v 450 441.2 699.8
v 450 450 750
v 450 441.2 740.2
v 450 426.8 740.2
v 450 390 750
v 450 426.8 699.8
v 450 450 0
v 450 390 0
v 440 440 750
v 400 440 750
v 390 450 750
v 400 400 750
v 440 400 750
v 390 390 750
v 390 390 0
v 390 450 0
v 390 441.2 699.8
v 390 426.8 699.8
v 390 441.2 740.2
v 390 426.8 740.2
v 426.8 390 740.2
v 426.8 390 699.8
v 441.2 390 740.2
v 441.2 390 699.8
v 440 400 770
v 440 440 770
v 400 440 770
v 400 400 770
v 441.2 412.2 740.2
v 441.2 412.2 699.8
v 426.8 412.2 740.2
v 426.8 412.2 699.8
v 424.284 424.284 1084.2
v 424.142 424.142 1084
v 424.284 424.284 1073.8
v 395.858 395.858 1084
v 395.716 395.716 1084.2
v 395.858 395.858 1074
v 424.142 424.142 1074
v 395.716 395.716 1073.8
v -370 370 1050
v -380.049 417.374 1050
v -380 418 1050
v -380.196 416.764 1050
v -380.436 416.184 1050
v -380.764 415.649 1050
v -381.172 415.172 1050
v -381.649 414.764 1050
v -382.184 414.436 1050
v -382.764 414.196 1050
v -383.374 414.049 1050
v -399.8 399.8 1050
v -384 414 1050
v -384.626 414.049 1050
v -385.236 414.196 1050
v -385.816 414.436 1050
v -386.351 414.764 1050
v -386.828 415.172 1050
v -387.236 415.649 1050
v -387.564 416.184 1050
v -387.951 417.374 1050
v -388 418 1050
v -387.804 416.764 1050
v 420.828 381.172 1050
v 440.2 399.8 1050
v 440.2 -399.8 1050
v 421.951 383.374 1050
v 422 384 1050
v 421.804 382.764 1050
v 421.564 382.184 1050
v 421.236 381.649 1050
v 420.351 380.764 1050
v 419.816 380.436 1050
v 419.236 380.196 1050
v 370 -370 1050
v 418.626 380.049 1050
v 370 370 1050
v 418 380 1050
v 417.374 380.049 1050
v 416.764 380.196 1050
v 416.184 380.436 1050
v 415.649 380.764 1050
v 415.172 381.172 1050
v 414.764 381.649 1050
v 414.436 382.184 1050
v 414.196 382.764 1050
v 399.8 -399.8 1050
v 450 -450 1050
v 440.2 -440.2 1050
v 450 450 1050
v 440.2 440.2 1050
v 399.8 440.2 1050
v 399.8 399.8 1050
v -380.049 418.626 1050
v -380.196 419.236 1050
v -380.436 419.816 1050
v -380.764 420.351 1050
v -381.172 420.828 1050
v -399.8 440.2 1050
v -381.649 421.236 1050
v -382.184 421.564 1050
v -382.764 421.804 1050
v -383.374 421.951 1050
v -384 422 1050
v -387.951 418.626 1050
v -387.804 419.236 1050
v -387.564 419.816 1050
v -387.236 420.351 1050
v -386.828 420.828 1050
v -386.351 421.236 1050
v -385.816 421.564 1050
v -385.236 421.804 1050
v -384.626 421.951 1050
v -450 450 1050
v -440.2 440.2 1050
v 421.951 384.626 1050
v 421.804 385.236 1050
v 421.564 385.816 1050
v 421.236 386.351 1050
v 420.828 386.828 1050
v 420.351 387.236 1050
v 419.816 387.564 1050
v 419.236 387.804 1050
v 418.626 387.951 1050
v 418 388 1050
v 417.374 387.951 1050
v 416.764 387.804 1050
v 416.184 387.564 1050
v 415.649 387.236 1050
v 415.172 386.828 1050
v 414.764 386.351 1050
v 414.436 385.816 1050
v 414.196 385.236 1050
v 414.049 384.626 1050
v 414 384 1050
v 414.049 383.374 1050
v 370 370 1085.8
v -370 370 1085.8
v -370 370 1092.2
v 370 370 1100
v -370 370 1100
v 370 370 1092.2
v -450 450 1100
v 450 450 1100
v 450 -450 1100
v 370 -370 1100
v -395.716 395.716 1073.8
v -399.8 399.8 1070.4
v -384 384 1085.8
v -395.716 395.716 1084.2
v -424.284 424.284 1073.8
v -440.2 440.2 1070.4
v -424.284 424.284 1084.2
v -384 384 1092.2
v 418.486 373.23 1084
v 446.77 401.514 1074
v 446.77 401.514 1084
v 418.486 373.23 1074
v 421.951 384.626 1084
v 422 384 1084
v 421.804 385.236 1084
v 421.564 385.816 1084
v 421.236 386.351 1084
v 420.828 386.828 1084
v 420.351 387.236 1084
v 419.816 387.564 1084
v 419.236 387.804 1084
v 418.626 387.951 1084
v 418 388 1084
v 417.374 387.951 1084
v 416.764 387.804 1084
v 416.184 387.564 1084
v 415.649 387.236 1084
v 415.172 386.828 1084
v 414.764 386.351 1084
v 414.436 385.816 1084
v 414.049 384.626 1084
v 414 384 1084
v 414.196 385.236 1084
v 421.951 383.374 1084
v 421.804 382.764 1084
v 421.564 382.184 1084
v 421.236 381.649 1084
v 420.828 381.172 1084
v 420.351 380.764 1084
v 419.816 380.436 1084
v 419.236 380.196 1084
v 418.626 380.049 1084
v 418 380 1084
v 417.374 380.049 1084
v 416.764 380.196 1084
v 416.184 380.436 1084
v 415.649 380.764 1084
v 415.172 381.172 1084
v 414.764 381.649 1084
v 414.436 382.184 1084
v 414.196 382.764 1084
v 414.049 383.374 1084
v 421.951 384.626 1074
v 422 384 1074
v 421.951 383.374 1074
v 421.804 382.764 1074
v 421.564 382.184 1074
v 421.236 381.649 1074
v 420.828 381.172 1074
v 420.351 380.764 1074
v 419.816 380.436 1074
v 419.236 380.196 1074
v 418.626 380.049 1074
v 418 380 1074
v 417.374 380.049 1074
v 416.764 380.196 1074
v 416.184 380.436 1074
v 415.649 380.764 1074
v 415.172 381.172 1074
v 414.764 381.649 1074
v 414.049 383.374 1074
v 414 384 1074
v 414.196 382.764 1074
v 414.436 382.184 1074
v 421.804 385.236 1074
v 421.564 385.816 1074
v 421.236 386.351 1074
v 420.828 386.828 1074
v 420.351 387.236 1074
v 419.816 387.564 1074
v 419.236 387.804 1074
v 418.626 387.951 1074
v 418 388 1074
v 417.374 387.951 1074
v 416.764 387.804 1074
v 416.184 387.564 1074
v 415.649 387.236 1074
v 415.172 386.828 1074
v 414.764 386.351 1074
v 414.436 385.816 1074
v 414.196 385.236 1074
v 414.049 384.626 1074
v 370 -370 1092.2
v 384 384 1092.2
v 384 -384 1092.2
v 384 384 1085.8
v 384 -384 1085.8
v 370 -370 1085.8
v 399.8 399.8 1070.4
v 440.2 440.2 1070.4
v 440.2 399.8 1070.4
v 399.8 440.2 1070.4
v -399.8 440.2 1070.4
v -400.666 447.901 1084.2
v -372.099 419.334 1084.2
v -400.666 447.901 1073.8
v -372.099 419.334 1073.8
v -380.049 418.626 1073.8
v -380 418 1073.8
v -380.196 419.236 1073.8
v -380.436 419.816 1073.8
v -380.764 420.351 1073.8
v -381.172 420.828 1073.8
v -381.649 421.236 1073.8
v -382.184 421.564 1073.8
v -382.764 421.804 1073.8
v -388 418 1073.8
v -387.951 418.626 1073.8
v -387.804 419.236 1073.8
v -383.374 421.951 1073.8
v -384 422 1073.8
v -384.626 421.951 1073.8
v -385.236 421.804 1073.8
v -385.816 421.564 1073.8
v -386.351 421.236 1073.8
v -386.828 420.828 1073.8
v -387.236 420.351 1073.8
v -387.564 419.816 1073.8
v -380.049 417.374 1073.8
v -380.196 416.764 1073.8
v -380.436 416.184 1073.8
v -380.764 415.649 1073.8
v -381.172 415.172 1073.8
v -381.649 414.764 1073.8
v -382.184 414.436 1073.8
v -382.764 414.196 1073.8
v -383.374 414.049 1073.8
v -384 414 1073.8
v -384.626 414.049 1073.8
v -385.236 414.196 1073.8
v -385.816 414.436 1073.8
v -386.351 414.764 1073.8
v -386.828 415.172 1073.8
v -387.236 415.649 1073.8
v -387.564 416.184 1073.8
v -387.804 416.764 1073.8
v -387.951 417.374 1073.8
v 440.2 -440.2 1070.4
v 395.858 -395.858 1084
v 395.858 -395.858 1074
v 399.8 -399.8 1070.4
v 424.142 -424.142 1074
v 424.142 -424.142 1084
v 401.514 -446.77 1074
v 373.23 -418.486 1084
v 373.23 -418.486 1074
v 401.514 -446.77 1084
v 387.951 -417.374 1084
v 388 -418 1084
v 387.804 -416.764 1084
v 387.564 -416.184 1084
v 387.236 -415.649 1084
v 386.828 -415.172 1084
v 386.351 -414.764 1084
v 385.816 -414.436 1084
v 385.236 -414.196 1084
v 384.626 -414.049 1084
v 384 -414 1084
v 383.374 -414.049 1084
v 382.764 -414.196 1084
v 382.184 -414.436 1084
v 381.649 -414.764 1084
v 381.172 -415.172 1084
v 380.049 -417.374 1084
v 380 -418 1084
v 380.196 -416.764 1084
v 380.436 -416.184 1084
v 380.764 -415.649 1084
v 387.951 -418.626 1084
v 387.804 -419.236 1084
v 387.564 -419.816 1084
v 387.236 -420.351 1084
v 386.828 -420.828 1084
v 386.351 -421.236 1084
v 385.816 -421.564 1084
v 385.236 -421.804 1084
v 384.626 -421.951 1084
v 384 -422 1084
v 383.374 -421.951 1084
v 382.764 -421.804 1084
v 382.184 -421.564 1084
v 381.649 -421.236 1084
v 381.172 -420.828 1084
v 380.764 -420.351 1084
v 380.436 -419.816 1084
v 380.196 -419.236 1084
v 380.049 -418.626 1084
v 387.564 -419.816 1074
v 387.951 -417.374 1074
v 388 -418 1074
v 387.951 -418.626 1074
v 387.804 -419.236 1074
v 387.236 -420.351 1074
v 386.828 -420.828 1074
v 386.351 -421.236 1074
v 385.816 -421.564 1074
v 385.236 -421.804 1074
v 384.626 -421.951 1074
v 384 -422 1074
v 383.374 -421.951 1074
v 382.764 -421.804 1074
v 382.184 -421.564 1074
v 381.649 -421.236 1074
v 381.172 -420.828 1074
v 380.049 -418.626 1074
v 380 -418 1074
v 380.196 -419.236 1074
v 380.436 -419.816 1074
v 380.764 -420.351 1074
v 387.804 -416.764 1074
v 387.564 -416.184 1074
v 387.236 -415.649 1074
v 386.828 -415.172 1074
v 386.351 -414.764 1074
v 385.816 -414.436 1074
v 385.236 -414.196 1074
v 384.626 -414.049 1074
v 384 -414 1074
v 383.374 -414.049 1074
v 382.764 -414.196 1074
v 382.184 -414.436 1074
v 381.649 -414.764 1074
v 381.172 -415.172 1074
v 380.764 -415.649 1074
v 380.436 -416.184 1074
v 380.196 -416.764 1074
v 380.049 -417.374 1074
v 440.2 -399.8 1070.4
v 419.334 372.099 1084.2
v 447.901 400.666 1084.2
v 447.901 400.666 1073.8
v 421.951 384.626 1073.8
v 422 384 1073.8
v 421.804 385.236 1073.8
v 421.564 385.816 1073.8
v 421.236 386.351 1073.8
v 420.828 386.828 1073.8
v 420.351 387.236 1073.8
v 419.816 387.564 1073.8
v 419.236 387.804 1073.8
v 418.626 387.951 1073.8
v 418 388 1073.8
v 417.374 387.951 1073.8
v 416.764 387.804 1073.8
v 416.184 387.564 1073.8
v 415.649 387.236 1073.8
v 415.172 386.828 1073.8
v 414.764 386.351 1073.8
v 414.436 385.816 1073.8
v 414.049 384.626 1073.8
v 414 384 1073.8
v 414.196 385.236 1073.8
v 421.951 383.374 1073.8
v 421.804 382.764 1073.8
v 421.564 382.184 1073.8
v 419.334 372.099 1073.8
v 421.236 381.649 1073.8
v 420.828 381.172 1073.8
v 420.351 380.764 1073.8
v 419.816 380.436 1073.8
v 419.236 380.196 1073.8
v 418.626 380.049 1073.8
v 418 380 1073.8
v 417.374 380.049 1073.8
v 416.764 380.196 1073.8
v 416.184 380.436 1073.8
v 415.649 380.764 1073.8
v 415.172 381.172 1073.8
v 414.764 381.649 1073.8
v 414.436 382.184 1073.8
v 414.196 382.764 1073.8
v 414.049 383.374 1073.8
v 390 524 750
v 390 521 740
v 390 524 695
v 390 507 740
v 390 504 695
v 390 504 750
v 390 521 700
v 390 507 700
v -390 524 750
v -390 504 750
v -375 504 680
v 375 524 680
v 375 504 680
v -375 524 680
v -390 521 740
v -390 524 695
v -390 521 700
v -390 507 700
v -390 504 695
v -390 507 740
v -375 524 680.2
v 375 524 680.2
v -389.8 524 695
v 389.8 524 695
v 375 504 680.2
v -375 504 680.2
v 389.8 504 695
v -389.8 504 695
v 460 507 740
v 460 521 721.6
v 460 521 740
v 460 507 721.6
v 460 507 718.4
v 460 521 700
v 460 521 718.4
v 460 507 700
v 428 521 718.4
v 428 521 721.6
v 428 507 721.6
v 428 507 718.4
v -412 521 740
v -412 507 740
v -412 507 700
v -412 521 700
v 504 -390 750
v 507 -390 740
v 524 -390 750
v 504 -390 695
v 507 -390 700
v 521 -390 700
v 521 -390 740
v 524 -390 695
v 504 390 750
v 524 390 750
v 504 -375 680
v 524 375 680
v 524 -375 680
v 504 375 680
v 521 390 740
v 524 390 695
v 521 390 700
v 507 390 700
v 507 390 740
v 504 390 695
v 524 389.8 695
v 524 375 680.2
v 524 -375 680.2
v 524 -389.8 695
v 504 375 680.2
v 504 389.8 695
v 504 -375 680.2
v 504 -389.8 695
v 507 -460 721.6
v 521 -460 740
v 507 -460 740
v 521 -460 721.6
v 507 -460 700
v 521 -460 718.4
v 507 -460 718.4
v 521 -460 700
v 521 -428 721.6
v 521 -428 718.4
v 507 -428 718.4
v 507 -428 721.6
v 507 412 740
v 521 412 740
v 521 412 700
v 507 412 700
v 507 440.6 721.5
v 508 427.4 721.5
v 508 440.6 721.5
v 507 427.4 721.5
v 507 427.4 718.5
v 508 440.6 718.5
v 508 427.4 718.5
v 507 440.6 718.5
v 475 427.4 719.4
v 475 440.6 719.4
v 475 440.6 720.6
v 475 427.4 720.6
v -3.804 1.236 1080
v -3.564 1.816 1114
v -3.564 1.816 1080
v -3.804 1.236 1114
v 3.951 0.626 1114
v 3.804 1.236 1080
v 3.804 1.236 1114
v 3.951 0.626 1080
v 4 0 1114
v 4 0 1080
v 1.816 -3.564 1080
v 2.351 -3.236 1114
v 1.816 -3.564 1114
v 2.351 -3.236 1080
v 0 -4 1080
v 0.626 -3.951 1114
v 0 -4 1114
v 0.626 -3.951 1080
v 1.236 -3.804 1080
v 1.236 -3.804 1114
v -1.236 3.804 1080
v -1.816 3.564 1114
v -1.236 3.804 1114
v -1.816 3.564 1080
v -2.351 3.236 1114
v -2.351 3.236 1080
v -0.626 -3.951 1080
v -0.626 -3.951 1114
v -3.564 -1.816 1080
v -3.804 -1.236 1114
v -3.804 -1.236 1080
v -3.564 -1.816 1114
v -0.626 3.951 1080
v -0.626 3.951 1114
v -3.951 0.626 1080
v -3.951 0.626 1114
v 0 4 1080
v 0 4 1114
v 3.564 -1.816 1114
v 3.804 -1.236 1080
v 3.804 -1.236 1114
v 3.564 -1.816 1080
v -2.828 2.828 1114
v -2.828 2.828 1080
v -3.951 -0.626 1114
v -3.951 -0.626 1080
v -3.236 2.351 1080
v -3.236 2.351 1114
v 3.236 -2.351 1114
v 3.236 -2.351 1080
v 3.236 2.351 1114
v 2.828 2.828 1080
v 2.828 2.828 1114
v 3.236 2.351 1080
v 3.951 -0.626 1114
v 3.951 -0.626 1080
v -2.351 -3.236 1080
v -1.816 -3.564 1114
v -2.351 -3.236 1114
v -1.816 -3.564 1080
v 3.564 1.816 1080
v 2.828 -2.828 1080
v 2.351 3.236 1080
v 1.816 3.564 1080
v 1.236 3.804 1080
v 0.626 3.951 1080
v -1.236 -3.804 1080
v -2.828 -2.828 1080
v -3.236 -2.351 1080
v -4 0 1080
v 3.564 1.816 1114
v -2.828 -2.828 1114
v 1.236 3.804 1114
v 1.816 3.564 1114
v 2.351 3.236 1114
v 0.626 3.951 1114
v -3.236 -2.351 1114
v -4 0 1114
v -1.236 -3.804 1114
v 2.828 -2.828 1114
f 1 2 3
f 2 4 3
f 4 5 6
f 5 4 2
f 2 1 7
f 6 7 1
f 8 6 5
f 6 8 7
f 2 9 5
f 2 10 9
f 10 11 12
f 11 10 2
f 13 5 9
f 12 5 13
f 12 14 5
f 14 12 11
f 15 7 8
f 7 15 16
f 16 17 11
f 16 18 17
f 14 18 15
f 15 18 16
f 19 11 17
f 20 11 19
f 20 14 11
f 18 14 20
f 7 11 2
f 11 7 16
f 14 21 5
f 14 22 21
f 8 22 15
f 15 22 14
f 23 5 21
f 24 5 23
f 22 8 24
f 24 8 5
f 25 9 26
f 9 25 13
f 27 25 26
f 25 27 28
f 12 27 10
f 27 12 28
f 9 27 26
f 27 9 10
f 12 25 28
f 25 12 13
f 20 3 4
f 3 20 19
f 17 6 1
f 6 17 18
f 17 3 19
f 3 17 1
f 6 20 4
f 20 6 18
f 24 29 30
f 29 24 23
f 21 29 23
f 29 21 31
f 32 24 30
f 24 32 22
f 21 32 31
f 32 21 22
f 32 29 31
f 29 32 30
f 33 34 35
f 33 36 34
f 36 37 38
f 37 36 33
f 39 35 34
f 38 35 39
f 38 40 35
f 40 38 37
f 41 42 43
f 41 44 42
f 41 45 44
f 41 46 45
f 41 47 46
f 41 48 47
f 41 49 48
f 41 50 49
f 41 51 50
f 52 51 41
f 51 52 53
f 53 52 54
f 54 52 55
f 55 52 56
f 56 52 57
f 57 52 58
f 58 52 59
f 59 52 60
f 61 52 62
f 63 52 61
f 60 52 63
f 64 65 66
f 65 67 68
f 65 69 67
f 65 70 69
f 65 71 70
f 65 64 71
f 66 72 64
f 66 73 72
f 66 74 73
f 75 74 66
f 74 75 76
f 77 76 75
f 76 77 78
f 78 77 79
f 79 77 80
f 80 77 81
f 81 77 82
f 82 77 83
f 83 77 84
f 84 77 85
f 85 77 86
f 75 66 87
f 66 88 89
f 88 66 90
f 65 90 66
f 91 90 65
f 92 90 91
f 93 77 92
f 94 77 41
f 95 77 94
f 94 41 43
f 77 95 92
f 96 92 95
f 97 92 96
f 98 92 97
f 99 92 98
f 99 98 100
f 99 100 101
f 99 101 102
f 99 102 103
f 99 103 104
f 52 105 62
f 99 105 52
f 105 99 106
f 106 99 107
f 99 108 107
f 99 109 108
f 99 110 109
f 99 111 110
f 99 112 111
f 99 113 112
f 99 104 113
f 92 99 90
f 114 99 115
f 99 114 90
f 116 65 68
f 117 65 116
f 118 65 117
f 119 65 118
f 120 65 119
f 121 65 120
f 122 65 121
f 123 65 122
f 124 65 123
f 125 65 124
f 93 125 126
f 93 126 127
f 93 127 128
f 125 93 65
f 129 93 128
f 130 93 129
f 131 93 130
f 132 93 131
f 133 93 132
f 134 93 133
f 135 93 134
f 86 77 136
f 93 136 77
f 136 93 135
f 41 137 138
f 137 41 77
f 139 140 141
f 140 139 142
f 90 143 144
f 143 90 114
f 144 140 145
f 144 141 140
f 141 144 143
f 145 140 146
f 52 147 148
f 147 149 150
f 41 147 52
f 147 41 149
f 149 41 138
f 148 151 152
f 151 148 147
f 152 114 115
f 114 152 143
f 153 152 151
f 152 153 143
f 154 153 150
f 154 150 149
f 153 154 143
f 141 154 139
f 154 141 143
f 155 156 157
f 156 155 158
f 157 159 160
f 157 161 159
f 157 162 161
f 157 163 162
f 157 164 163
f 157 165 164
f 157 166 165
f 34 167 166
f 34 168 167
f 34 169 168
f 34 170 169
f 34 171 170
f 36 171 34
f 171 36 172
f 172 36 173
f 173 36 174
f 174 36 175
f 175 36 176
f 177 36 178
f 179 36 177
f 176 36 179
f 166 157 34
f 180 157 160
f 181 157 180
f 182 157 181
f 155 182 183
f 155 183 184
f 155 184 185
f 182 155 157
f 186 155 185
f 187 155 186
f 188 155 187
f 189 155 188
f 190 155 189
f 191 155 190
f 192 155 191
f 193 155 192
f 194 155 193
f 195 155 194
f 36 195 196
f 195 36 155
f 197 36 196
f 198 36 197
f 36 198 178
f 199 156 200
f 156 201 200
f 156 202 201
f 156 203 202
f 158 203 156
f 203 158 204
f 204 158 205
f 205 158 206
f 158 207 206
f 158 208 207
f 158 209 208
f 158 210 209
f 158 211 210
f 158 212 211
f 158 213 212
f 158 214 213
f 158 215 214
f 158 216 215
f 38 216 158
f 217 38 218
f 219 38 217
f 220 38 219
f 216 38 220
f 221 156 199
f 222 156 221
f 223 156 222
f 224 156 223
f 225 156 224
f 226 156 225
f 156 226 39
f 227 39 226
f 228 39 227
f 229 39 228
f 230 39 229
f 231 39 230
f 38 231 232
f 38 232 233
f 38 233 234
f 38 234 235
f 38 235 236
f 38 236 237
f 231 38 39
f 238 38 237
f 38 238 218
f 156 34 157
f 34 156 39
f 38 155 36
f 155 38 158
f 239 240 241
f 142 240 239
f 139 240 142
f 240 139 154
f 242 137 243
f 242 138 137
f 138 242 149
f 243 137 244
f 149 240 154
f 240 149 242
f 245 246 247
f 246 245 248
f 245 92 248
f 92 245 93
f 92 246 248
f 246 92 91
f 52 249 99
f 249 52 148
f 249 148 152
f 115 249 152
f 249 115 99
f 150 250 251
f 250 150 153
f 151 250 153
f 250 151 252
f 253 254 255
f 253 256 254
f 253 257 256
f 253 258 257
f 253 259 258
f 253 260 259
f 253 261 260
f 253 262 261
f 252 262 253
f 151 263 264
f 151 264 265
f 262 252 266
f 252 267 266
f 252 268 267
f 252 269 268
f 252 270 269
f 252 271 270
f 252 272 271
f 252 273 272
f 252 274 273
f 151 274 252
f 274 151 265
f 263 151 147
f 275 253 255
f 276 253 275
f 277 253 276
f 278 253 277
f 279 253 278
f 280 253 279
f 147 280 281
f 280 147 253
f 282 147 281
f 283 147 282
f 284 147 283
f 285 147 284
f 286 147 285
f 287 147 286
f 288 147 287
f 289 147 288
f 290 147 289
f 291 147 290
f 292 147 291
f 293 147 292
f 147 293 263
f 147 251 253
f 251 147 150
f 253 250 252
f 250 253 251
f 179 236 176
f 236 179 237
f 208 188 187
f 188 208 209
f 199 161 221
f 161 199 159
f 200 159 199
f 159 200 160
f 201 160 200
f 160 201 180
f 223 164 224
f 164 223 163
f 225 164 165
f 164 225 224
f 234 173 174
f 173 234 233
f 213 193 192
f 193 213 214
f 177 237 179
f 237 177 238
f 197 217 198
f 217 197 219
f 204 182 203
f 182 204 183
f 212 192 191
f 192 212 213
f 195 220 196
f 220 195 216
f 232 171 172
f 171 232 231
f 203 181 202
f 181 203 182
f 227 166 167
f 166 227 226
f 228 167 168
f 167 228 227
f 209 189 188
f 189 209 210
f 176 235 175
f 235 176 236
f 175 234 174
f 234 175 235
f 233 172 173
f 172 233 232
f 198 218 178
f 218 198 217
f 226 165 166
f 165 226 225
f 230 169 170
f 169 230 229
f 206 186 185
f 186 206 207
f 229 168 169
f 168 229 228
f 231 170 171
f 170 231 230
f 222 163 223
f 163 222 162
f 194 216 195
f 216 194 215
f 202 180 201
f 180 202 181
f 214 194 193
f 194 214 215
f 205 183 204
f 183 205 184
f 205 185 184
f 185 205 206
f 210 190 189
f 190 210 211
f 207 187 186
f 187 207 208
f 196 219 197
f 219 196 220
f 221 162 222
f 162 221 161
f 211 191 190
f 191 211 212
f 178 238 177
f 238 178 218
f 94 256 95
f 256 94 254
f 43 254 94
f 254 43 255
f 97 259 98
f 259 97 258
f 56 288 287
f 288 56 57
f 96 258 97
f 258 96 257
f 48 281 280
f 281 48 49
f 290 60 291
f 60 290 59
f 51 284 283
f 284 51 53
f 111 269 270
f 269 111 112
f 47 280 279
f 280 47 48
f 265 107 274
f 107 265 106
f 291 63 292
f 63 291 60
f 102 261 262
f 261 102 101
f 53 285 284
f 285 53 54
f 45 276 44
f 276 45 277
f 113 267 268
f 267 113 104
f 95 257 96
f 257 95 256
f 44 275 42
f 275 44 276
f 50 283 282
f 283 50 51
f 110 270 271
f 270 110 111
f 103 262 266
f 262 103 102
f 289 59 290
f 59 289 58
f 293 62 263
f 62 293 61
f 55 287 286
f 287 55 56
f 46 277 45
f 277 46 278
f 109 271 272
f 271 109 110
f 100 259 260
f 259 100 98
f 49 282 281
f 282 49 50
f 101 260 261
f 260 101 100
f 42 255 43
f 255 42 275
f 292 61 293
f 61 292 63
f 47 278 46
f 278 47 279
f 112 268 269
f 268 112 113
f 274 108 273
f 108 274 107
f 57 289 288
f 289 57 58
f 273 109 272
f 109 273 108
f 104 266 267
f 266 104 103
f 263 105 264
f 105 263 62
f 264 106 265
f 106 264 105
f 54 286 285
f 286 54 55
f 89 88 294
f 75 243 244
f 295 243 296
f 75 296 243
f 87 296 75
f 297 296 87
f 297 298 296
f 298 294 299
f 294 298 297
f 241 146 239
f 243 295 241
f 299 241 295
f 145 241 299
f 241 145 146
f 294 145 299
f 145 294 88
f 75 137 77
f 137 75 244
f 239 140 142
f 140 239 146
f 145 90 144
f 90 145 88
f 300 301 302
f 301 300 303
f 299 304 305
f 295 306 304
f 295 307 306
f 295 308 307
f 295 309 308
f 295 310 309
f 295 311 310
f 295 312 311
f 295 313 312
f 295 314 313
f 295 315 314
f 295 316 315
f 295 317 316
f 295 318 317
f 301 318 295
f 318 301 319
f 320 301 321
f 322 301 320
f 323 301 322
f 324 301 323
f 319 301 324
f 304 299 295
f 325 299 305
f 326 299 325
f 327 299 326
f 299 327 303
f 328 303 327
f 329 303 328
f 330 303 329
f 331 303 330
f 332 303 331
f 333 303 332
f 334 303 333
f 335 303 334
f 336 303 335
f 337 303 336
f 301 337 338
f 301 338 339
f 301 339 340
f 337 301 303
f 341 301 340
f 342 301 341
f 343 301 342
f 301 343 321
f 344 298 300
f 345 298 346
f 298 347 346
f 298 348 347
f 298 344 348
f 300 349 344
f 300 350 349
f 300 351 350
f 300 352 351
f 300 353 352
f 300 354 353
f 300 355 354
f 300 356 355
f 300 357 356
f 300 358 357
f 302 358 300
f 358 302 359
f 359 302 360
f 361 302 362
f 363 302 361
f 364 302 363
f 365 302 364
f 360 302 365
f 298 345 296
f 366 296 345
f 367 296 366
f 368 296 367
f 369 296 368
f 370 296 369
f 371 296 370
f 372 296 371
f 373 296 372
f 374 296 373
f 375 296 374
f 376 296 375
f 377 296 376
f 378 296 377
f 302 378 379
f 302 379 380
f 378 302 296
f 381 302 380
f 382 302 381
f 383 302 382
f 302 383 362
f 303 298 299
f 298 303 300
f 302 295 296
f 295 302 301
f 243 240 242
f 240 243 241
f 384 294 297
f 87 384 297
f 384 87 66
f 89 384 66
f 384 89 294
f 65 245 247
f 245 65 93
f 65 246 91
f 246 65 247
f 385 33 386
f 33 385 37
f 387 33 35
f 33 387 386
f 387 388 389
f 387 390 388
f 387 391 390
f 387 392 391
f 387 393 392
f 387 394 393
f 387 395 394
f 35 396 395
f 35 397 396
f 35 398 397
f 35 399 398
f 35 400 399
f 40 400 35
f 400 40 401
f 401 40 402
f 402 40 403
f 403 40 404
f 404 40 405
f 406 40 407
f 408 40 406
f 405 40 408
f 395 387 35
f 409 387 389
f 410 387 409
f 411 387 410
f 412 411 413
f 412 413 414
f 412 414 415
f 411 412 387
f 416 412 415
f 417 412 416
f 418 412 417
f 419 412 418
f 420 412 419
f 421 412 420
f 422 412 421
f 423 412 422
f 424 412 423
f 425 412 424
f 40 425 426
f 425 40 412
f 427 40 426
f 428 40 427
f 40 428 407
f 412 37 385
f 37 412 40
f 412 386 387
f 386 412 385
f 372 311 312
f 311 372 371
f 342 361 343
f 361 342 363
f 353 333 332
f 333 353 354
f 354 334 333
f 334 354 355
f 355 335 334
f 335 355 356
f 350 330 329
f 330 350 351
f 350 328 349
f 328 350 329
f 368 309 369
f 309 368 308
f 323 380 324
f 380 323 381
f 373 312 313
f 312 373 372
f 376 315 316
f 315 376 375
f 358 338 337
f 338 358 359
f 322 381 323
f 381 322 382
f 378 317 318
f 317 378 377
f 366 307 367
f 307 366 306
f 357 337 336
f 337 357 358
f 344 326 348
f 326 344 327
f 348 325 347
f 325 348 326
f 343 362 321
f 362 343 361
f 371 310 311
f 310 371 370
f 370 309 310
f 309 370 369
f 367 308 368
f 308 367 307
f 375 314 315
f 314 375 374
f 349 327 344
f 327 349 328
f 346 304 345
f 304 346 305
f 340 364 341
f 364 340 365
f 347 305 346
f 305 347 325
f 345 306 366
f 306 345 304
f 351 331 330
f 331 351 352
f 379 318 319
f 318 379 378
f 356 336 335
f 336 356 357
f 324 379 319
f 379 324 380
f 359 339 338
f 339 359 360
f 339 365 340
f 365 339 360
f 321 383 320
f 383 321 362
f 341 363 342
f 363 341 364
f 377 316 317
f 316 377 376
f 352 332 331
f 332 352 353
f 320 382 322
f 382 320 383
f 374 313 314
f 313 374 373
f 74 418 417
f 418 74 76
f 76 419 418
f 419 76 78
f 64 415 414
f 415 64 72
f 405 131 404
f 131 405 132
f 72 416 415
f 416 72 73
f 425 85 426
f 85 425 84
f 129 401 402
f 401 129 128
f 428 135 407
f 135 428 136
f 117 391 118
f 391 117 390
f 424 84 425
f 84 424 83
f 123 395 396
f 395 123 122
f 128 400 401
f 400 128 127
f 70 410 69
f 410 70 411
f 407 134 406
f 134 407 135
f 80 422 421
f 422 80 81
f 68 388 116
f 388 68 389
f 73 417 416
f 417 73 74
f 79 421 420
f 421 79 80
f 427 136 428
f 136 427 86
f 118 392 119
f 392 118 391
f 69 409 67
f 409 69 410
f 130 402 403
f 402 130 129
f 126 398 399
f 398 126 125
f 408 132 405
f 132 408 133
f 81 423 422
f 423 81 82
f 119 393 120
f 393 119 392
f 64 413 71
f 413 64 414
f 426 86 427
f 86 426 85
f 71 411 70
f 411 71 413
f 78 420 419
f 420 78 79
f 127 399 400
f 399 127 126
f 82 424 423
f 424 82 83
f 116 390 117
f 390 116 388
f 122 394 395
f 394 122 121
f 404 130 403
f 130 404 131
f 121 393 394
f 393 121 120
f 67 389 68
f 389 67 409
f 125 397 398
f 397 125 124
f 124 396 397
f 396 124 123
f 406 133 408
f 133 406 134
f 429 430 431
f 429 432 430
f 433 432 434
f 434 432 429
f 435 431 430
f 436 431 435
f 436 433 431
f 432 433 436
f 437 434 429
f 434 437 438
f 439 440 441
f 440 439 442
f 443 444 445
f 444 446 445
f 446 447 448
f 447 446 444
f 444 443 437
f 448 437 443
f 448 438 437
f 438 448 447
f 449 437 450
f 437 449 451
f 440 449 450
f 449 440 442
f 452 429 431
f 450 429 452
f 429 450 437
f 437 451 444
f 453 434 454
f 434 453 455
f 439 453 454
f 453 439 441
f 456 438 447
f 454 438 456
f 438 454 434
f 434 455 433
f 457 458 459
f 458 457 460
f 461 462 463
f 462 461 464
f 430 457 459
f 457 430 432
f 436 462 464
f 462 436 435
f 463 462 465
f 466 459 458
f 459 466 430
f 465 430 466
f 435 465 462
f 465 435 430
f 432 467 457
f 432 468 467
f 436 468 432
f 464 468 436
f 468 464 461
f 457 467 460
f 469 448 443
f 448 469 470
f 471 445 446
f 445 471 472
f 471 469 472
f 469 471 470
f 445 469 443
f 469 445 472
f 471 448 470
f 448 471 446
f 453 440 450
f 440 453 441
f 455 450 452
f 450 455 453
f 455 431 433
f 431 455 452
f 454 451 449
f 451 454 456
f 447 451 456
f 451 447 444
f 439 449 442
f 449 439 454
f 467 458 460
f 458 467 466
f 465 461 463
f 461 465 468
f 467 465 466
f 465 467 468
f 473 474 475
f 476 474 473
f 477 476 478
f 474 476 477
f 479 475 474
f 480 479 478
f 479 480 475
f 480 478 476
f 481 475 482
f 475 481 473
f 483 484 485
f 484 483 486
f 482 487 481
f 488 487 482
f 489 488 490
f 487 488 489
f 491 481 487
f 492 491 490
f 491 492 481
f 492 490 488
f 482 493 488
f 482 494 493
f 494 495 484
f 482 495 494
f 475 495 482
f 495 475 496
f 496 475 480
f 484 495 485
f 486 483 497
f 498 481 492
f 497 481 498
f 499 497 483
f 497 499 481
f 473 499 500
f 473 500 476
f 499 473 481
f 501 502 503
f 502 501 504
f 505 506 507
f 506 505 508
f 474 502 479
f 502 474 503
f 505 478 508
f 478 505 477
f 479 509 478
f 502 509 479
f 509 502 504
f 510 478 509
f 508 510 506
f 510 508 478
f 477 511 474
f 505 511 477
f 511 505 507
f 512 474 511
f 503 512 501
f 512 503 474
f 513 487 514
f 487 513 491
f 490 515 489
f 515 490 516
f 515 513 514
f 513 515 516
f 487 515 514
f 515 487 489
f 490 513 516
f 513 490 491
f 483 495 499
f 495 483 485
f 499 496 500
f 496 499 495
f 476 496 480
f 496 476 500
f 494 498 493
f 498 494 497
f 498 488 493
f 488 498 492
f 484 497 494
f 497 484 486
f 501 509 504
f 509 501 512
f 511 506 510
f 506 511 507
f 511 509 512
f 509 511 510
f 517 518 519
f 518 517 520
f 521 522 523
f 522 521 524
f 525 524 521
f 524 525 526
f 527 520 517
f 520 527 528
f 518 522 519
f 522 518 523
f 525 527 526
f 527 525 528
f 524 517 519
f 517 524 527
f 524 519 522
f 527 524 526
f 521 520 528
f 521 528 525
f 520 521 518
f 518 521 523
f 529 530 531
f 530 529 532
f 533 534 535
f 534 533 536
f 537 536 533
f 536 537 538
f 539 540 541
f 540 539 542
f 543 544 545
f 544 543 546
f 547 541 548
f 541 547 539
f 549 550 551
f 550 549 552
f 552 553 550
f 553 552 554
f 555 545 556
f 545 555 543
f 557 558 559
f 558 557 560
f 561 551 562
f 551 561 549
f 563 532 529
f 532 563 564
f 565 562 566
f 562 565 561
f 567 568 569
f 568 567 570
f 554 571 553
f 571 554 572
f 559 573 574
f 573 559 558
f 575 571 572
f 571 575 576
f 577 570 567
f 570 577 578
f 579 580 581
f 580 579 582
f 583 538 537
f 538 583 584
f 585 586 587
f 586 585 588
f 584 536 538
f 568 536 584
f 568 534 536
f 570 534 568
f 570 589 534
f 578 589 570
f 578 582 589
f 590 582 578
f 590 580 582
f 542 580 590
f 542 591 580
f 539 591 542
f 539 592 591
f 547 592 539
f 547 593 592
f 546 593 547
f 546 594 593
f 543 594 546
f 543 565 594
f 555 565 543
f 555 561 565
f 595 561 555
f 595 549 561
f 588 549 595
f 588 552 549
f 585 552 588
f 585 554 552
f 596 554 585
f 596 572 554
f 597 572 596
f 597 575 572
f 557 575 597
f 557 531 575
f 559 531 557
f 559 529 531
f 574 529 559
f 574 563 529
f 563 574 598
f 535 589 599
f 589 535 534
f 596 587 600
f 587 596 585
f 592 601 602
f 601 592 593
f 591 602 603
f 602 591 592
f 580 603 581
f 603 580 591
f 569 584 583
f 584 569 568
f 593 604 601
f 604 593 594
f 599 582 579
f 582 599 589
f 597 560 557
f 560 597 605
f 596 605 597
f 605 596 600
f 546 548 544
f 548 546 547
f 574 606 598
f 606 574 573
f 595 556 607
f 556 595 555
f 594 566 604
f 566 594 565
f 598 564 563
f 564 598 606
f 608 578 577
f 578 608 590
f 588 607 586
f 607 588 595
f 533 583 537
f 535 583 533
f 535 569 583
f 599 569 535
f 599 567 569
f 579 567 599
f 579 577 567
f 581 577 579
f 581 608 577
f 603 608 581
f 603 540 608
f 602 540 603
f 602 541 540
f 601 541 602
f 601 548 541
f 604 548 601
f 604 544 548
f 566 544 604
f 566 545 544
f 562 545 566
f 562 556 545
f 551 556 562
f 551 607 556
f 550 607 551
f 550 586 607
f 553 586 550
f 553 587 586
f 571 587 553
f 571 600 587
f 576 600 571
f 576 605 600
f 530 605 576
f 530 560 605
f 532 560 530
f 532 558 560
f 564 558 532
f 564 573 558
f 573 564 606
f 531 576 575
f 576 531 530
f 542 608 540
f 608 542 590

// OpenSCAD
// file: parts.scad
$fn=40;

// ---- 桌腿 ----

module leg(){
  difference(){
    union(){
      translate([390.000,390.000,0.000]) cube([60.000,60.000,750.000]);
      translate([400.000,400.000,750.000]) cube([40.000,40.000,20.000]);
    }
    // 牙板透榫槽（沿 +x，+y 侧牙板 A 端穿入）
    translate([389.000,426.800,699.800]) cube([62.000,14.400,40.400]);
    // 牙板闷榫槽（沿 +y，+x 侧牙板 B 端）
    translate([426.800,389.000,699.800]) cube([14.400,23.200,40.400]);
  }
}

// ---- 边框 ----

module rail(){
  difference(){
    union(){
      translate([0,0,750]) linear_extrude(height=50) polygon(points=[[-370,370],[370,370],[450.0,450.0],[-450.0,450.0]]);
      translate([420.607,399.393,779.0]) rotate([0,0,-45]) cube([34,40,10],center=true);
    }
    // 面板槽：全长开通至 45° 端面（角部两框的槽合起来成 L 形）
    translate([-450.000,370.000,785.800]) cube([900.000,14.000,6.400]);
    // 腿顶榫卯（两端各半，合起来 40x40x20）
    translate([399.800,399.800,750.000]) cube([40.400,40.400,20.400]);
    translate([-440.200,399.800,750.000]) cube([40.400,40.400,20.400]);
    // 格角暗榫卯
    translate([-398.545,421.455,779.0]) rotate([0,0,45]) cube([34.4,40.4,10.4],center=true);
    // 竹销孔：+x 端穿暗榫，-x 端穿本体
    translate([418,384,750]) cylinder(h=34,r=4.0,$fn=40);
    translate([-384,418,750]) cylinder(h=34,r=4.0,$fn=40);
  }
}

// ---- 牙板 ----

module apron(){
  difference(){
    union(){
      translate([-390.000,424.000,680.000]) cube([780.000,20.000,70.000]);
      // A 端：透榫（390..460）
      translate([390.000,427.000,700.000]) cube([70.000,14.000,40.000]);
      // B 端：闷榫（-412..-390）
      translate([-412.000,427.000,700.000]) cube([22.000,14.000,40.000]);
    }
    hull(){ translate([375.000,423.500,680.000]) cube([15.000,21.000,0.200]); translate([389.800,423.500,680.000]) cube([0.200,21.000,15.000]); }
    hull(){ translate([-390.000,423.500,680.000]) cube([15.000,21.000,0.200]); translate([-390.000,423.500,680.000]) cube([0.200,21.000,15.000]); }
    // 透榫楔槽（横槽，撑开榫头上下两片）
    translate([428.000,426.900,718.400]) cube([32.200,14.200,3.200]);
  }
}

// ---- 面板-边板 ----

module panel_outer(){
  difference(){
    union(){
      translate([-365.000,-365.000,778.000]) cube([730.000,244.000,22.000]);
      translate([0,0,786]) linear_extrude(height=6) polygon(points=[[-379,-121],[-379,-377],[-377,-379],[377,-379],[379,-377],[379,-121],[365,-121],[365,-365],[-365,-365],[-365,-121]]);
    }
    // 内侧龙凤榫槽（向板内 8 深：y -129..-121）
    translate([-365.000,-129.000,785.800]) cube([730.000,8.000,6.400]);
    // 穿带燕尾槽
    hull(){ translate([-259.200,-365.000,778.000]) cube([30.400,244.000,0.100]); translate([-266.200,-365.000,783.900]) cube([44.400,244.000,0.100]); }
    hull(){ translate([-15.200,-365.000,778.000]) cube([30.400,244.000,0.100]); translate([-22.200,-365.000,783.900]) cube([44.400,244.000,0.100]); }
    hull(){ translate([228.800,-365.000,778.000]) cube([30.400,244.000,0.100]); translate([221.800,-365.000,783.900]) cube([44.400,244.000,0.100]); }
  }
}

// ---- 面板-中板 ----

module panel_middle(){
  difference(){
    union(){
      translate([-365.000,-121.000,778.000]) cube([730.000,242.000,22.000]);
      translate([365.000,-121.000,786.000]) cube([14.000,242.000,6.000]);
      translate([-379.000,-121.000,786.000]) cube([14.000,242.000,6.000]);
    }
    // 两侧龙凤榫槽（各向板内 8 深）
    translate([-365.000,-121.000,785.800]) cube([730.000,8.000,6.400]);
    translate([-365.000,113.000,785.800]) cube([730.000,8.000,6.400]);
    hull(){ translate([-259.200,-121.000,778.000]) cube([30.400,242.000,0.100]); translate([-266.200,-121.000,783.900]) cube([44.400,242.000,0.100]); }
    hull(){ translate([-15.200,-121.000,778.000]) cube([30.400,242.000,0.100]); translate([-22.200,-121.000,783.900]) cube([44.400,242.000,0.100]); }
    hull(){ translate([228.800,-121.000,778.000]) cube([30.400,242.000,0.100]); translate([221.800,-121.000,783.900]) cube([44.400,242.000,0.100]); }
  }
}

// ---- 穿带 ----

module cleat(){
  union(){
    translate([-20.000,-363.000,752.000]) cube([40.000,726.000,26.000]);
    hull(){
      translate([-15.000,-363.000,777.900]) cube([30.000,726.000,0.050]);
      translate([-22.000,-363.000,783.800]) cube([44.000,726.000,0.100]);
    }
  }
}

// ---- 穿簧 ----
module spline(){ translate([-360.000,-7.800,786.100]) cube([720.000,15.600,5.800]); }
// ---- 木楔 ----
module wedge(){ hull(){ translate([435.000,427.400,719.400]) cube([1.000,13.200,1.200]); translate([467.000,427.400,718.500]) cube([1.000,13.200,3.000]); } }
// ---- 竹销 ----
module pin(){ translate([0,0,750]) cylinder(h=34,r=4.0,$fn=40); }
// main file
include <parts.scad>
color([0.42,0.28,0.16]) translate([0,0,0]) rotate([0,0,0]) leg();color([0.54,0.37,0.21]) translate([0,0,300]) rotate([0,0,0]) rail();color([0.54,0.37,0.21]) translate([0,0,300]) rotate([0,0,270]) rail();color([0.49,0.33,0.19]) translate([0,80,0]) rotate([0,0,0]) apron();color([0.49,0.33,0.19]) translate([80,0,0]) rotate([0,0,270]) apron();color([0.30,0.19,0.10]) translate([40,0,0]) rotate([0,0,0]) wedge();color([0.86,0.80,0.55]) translate([0,0,330]) rotate([0,0,0]) pin();
